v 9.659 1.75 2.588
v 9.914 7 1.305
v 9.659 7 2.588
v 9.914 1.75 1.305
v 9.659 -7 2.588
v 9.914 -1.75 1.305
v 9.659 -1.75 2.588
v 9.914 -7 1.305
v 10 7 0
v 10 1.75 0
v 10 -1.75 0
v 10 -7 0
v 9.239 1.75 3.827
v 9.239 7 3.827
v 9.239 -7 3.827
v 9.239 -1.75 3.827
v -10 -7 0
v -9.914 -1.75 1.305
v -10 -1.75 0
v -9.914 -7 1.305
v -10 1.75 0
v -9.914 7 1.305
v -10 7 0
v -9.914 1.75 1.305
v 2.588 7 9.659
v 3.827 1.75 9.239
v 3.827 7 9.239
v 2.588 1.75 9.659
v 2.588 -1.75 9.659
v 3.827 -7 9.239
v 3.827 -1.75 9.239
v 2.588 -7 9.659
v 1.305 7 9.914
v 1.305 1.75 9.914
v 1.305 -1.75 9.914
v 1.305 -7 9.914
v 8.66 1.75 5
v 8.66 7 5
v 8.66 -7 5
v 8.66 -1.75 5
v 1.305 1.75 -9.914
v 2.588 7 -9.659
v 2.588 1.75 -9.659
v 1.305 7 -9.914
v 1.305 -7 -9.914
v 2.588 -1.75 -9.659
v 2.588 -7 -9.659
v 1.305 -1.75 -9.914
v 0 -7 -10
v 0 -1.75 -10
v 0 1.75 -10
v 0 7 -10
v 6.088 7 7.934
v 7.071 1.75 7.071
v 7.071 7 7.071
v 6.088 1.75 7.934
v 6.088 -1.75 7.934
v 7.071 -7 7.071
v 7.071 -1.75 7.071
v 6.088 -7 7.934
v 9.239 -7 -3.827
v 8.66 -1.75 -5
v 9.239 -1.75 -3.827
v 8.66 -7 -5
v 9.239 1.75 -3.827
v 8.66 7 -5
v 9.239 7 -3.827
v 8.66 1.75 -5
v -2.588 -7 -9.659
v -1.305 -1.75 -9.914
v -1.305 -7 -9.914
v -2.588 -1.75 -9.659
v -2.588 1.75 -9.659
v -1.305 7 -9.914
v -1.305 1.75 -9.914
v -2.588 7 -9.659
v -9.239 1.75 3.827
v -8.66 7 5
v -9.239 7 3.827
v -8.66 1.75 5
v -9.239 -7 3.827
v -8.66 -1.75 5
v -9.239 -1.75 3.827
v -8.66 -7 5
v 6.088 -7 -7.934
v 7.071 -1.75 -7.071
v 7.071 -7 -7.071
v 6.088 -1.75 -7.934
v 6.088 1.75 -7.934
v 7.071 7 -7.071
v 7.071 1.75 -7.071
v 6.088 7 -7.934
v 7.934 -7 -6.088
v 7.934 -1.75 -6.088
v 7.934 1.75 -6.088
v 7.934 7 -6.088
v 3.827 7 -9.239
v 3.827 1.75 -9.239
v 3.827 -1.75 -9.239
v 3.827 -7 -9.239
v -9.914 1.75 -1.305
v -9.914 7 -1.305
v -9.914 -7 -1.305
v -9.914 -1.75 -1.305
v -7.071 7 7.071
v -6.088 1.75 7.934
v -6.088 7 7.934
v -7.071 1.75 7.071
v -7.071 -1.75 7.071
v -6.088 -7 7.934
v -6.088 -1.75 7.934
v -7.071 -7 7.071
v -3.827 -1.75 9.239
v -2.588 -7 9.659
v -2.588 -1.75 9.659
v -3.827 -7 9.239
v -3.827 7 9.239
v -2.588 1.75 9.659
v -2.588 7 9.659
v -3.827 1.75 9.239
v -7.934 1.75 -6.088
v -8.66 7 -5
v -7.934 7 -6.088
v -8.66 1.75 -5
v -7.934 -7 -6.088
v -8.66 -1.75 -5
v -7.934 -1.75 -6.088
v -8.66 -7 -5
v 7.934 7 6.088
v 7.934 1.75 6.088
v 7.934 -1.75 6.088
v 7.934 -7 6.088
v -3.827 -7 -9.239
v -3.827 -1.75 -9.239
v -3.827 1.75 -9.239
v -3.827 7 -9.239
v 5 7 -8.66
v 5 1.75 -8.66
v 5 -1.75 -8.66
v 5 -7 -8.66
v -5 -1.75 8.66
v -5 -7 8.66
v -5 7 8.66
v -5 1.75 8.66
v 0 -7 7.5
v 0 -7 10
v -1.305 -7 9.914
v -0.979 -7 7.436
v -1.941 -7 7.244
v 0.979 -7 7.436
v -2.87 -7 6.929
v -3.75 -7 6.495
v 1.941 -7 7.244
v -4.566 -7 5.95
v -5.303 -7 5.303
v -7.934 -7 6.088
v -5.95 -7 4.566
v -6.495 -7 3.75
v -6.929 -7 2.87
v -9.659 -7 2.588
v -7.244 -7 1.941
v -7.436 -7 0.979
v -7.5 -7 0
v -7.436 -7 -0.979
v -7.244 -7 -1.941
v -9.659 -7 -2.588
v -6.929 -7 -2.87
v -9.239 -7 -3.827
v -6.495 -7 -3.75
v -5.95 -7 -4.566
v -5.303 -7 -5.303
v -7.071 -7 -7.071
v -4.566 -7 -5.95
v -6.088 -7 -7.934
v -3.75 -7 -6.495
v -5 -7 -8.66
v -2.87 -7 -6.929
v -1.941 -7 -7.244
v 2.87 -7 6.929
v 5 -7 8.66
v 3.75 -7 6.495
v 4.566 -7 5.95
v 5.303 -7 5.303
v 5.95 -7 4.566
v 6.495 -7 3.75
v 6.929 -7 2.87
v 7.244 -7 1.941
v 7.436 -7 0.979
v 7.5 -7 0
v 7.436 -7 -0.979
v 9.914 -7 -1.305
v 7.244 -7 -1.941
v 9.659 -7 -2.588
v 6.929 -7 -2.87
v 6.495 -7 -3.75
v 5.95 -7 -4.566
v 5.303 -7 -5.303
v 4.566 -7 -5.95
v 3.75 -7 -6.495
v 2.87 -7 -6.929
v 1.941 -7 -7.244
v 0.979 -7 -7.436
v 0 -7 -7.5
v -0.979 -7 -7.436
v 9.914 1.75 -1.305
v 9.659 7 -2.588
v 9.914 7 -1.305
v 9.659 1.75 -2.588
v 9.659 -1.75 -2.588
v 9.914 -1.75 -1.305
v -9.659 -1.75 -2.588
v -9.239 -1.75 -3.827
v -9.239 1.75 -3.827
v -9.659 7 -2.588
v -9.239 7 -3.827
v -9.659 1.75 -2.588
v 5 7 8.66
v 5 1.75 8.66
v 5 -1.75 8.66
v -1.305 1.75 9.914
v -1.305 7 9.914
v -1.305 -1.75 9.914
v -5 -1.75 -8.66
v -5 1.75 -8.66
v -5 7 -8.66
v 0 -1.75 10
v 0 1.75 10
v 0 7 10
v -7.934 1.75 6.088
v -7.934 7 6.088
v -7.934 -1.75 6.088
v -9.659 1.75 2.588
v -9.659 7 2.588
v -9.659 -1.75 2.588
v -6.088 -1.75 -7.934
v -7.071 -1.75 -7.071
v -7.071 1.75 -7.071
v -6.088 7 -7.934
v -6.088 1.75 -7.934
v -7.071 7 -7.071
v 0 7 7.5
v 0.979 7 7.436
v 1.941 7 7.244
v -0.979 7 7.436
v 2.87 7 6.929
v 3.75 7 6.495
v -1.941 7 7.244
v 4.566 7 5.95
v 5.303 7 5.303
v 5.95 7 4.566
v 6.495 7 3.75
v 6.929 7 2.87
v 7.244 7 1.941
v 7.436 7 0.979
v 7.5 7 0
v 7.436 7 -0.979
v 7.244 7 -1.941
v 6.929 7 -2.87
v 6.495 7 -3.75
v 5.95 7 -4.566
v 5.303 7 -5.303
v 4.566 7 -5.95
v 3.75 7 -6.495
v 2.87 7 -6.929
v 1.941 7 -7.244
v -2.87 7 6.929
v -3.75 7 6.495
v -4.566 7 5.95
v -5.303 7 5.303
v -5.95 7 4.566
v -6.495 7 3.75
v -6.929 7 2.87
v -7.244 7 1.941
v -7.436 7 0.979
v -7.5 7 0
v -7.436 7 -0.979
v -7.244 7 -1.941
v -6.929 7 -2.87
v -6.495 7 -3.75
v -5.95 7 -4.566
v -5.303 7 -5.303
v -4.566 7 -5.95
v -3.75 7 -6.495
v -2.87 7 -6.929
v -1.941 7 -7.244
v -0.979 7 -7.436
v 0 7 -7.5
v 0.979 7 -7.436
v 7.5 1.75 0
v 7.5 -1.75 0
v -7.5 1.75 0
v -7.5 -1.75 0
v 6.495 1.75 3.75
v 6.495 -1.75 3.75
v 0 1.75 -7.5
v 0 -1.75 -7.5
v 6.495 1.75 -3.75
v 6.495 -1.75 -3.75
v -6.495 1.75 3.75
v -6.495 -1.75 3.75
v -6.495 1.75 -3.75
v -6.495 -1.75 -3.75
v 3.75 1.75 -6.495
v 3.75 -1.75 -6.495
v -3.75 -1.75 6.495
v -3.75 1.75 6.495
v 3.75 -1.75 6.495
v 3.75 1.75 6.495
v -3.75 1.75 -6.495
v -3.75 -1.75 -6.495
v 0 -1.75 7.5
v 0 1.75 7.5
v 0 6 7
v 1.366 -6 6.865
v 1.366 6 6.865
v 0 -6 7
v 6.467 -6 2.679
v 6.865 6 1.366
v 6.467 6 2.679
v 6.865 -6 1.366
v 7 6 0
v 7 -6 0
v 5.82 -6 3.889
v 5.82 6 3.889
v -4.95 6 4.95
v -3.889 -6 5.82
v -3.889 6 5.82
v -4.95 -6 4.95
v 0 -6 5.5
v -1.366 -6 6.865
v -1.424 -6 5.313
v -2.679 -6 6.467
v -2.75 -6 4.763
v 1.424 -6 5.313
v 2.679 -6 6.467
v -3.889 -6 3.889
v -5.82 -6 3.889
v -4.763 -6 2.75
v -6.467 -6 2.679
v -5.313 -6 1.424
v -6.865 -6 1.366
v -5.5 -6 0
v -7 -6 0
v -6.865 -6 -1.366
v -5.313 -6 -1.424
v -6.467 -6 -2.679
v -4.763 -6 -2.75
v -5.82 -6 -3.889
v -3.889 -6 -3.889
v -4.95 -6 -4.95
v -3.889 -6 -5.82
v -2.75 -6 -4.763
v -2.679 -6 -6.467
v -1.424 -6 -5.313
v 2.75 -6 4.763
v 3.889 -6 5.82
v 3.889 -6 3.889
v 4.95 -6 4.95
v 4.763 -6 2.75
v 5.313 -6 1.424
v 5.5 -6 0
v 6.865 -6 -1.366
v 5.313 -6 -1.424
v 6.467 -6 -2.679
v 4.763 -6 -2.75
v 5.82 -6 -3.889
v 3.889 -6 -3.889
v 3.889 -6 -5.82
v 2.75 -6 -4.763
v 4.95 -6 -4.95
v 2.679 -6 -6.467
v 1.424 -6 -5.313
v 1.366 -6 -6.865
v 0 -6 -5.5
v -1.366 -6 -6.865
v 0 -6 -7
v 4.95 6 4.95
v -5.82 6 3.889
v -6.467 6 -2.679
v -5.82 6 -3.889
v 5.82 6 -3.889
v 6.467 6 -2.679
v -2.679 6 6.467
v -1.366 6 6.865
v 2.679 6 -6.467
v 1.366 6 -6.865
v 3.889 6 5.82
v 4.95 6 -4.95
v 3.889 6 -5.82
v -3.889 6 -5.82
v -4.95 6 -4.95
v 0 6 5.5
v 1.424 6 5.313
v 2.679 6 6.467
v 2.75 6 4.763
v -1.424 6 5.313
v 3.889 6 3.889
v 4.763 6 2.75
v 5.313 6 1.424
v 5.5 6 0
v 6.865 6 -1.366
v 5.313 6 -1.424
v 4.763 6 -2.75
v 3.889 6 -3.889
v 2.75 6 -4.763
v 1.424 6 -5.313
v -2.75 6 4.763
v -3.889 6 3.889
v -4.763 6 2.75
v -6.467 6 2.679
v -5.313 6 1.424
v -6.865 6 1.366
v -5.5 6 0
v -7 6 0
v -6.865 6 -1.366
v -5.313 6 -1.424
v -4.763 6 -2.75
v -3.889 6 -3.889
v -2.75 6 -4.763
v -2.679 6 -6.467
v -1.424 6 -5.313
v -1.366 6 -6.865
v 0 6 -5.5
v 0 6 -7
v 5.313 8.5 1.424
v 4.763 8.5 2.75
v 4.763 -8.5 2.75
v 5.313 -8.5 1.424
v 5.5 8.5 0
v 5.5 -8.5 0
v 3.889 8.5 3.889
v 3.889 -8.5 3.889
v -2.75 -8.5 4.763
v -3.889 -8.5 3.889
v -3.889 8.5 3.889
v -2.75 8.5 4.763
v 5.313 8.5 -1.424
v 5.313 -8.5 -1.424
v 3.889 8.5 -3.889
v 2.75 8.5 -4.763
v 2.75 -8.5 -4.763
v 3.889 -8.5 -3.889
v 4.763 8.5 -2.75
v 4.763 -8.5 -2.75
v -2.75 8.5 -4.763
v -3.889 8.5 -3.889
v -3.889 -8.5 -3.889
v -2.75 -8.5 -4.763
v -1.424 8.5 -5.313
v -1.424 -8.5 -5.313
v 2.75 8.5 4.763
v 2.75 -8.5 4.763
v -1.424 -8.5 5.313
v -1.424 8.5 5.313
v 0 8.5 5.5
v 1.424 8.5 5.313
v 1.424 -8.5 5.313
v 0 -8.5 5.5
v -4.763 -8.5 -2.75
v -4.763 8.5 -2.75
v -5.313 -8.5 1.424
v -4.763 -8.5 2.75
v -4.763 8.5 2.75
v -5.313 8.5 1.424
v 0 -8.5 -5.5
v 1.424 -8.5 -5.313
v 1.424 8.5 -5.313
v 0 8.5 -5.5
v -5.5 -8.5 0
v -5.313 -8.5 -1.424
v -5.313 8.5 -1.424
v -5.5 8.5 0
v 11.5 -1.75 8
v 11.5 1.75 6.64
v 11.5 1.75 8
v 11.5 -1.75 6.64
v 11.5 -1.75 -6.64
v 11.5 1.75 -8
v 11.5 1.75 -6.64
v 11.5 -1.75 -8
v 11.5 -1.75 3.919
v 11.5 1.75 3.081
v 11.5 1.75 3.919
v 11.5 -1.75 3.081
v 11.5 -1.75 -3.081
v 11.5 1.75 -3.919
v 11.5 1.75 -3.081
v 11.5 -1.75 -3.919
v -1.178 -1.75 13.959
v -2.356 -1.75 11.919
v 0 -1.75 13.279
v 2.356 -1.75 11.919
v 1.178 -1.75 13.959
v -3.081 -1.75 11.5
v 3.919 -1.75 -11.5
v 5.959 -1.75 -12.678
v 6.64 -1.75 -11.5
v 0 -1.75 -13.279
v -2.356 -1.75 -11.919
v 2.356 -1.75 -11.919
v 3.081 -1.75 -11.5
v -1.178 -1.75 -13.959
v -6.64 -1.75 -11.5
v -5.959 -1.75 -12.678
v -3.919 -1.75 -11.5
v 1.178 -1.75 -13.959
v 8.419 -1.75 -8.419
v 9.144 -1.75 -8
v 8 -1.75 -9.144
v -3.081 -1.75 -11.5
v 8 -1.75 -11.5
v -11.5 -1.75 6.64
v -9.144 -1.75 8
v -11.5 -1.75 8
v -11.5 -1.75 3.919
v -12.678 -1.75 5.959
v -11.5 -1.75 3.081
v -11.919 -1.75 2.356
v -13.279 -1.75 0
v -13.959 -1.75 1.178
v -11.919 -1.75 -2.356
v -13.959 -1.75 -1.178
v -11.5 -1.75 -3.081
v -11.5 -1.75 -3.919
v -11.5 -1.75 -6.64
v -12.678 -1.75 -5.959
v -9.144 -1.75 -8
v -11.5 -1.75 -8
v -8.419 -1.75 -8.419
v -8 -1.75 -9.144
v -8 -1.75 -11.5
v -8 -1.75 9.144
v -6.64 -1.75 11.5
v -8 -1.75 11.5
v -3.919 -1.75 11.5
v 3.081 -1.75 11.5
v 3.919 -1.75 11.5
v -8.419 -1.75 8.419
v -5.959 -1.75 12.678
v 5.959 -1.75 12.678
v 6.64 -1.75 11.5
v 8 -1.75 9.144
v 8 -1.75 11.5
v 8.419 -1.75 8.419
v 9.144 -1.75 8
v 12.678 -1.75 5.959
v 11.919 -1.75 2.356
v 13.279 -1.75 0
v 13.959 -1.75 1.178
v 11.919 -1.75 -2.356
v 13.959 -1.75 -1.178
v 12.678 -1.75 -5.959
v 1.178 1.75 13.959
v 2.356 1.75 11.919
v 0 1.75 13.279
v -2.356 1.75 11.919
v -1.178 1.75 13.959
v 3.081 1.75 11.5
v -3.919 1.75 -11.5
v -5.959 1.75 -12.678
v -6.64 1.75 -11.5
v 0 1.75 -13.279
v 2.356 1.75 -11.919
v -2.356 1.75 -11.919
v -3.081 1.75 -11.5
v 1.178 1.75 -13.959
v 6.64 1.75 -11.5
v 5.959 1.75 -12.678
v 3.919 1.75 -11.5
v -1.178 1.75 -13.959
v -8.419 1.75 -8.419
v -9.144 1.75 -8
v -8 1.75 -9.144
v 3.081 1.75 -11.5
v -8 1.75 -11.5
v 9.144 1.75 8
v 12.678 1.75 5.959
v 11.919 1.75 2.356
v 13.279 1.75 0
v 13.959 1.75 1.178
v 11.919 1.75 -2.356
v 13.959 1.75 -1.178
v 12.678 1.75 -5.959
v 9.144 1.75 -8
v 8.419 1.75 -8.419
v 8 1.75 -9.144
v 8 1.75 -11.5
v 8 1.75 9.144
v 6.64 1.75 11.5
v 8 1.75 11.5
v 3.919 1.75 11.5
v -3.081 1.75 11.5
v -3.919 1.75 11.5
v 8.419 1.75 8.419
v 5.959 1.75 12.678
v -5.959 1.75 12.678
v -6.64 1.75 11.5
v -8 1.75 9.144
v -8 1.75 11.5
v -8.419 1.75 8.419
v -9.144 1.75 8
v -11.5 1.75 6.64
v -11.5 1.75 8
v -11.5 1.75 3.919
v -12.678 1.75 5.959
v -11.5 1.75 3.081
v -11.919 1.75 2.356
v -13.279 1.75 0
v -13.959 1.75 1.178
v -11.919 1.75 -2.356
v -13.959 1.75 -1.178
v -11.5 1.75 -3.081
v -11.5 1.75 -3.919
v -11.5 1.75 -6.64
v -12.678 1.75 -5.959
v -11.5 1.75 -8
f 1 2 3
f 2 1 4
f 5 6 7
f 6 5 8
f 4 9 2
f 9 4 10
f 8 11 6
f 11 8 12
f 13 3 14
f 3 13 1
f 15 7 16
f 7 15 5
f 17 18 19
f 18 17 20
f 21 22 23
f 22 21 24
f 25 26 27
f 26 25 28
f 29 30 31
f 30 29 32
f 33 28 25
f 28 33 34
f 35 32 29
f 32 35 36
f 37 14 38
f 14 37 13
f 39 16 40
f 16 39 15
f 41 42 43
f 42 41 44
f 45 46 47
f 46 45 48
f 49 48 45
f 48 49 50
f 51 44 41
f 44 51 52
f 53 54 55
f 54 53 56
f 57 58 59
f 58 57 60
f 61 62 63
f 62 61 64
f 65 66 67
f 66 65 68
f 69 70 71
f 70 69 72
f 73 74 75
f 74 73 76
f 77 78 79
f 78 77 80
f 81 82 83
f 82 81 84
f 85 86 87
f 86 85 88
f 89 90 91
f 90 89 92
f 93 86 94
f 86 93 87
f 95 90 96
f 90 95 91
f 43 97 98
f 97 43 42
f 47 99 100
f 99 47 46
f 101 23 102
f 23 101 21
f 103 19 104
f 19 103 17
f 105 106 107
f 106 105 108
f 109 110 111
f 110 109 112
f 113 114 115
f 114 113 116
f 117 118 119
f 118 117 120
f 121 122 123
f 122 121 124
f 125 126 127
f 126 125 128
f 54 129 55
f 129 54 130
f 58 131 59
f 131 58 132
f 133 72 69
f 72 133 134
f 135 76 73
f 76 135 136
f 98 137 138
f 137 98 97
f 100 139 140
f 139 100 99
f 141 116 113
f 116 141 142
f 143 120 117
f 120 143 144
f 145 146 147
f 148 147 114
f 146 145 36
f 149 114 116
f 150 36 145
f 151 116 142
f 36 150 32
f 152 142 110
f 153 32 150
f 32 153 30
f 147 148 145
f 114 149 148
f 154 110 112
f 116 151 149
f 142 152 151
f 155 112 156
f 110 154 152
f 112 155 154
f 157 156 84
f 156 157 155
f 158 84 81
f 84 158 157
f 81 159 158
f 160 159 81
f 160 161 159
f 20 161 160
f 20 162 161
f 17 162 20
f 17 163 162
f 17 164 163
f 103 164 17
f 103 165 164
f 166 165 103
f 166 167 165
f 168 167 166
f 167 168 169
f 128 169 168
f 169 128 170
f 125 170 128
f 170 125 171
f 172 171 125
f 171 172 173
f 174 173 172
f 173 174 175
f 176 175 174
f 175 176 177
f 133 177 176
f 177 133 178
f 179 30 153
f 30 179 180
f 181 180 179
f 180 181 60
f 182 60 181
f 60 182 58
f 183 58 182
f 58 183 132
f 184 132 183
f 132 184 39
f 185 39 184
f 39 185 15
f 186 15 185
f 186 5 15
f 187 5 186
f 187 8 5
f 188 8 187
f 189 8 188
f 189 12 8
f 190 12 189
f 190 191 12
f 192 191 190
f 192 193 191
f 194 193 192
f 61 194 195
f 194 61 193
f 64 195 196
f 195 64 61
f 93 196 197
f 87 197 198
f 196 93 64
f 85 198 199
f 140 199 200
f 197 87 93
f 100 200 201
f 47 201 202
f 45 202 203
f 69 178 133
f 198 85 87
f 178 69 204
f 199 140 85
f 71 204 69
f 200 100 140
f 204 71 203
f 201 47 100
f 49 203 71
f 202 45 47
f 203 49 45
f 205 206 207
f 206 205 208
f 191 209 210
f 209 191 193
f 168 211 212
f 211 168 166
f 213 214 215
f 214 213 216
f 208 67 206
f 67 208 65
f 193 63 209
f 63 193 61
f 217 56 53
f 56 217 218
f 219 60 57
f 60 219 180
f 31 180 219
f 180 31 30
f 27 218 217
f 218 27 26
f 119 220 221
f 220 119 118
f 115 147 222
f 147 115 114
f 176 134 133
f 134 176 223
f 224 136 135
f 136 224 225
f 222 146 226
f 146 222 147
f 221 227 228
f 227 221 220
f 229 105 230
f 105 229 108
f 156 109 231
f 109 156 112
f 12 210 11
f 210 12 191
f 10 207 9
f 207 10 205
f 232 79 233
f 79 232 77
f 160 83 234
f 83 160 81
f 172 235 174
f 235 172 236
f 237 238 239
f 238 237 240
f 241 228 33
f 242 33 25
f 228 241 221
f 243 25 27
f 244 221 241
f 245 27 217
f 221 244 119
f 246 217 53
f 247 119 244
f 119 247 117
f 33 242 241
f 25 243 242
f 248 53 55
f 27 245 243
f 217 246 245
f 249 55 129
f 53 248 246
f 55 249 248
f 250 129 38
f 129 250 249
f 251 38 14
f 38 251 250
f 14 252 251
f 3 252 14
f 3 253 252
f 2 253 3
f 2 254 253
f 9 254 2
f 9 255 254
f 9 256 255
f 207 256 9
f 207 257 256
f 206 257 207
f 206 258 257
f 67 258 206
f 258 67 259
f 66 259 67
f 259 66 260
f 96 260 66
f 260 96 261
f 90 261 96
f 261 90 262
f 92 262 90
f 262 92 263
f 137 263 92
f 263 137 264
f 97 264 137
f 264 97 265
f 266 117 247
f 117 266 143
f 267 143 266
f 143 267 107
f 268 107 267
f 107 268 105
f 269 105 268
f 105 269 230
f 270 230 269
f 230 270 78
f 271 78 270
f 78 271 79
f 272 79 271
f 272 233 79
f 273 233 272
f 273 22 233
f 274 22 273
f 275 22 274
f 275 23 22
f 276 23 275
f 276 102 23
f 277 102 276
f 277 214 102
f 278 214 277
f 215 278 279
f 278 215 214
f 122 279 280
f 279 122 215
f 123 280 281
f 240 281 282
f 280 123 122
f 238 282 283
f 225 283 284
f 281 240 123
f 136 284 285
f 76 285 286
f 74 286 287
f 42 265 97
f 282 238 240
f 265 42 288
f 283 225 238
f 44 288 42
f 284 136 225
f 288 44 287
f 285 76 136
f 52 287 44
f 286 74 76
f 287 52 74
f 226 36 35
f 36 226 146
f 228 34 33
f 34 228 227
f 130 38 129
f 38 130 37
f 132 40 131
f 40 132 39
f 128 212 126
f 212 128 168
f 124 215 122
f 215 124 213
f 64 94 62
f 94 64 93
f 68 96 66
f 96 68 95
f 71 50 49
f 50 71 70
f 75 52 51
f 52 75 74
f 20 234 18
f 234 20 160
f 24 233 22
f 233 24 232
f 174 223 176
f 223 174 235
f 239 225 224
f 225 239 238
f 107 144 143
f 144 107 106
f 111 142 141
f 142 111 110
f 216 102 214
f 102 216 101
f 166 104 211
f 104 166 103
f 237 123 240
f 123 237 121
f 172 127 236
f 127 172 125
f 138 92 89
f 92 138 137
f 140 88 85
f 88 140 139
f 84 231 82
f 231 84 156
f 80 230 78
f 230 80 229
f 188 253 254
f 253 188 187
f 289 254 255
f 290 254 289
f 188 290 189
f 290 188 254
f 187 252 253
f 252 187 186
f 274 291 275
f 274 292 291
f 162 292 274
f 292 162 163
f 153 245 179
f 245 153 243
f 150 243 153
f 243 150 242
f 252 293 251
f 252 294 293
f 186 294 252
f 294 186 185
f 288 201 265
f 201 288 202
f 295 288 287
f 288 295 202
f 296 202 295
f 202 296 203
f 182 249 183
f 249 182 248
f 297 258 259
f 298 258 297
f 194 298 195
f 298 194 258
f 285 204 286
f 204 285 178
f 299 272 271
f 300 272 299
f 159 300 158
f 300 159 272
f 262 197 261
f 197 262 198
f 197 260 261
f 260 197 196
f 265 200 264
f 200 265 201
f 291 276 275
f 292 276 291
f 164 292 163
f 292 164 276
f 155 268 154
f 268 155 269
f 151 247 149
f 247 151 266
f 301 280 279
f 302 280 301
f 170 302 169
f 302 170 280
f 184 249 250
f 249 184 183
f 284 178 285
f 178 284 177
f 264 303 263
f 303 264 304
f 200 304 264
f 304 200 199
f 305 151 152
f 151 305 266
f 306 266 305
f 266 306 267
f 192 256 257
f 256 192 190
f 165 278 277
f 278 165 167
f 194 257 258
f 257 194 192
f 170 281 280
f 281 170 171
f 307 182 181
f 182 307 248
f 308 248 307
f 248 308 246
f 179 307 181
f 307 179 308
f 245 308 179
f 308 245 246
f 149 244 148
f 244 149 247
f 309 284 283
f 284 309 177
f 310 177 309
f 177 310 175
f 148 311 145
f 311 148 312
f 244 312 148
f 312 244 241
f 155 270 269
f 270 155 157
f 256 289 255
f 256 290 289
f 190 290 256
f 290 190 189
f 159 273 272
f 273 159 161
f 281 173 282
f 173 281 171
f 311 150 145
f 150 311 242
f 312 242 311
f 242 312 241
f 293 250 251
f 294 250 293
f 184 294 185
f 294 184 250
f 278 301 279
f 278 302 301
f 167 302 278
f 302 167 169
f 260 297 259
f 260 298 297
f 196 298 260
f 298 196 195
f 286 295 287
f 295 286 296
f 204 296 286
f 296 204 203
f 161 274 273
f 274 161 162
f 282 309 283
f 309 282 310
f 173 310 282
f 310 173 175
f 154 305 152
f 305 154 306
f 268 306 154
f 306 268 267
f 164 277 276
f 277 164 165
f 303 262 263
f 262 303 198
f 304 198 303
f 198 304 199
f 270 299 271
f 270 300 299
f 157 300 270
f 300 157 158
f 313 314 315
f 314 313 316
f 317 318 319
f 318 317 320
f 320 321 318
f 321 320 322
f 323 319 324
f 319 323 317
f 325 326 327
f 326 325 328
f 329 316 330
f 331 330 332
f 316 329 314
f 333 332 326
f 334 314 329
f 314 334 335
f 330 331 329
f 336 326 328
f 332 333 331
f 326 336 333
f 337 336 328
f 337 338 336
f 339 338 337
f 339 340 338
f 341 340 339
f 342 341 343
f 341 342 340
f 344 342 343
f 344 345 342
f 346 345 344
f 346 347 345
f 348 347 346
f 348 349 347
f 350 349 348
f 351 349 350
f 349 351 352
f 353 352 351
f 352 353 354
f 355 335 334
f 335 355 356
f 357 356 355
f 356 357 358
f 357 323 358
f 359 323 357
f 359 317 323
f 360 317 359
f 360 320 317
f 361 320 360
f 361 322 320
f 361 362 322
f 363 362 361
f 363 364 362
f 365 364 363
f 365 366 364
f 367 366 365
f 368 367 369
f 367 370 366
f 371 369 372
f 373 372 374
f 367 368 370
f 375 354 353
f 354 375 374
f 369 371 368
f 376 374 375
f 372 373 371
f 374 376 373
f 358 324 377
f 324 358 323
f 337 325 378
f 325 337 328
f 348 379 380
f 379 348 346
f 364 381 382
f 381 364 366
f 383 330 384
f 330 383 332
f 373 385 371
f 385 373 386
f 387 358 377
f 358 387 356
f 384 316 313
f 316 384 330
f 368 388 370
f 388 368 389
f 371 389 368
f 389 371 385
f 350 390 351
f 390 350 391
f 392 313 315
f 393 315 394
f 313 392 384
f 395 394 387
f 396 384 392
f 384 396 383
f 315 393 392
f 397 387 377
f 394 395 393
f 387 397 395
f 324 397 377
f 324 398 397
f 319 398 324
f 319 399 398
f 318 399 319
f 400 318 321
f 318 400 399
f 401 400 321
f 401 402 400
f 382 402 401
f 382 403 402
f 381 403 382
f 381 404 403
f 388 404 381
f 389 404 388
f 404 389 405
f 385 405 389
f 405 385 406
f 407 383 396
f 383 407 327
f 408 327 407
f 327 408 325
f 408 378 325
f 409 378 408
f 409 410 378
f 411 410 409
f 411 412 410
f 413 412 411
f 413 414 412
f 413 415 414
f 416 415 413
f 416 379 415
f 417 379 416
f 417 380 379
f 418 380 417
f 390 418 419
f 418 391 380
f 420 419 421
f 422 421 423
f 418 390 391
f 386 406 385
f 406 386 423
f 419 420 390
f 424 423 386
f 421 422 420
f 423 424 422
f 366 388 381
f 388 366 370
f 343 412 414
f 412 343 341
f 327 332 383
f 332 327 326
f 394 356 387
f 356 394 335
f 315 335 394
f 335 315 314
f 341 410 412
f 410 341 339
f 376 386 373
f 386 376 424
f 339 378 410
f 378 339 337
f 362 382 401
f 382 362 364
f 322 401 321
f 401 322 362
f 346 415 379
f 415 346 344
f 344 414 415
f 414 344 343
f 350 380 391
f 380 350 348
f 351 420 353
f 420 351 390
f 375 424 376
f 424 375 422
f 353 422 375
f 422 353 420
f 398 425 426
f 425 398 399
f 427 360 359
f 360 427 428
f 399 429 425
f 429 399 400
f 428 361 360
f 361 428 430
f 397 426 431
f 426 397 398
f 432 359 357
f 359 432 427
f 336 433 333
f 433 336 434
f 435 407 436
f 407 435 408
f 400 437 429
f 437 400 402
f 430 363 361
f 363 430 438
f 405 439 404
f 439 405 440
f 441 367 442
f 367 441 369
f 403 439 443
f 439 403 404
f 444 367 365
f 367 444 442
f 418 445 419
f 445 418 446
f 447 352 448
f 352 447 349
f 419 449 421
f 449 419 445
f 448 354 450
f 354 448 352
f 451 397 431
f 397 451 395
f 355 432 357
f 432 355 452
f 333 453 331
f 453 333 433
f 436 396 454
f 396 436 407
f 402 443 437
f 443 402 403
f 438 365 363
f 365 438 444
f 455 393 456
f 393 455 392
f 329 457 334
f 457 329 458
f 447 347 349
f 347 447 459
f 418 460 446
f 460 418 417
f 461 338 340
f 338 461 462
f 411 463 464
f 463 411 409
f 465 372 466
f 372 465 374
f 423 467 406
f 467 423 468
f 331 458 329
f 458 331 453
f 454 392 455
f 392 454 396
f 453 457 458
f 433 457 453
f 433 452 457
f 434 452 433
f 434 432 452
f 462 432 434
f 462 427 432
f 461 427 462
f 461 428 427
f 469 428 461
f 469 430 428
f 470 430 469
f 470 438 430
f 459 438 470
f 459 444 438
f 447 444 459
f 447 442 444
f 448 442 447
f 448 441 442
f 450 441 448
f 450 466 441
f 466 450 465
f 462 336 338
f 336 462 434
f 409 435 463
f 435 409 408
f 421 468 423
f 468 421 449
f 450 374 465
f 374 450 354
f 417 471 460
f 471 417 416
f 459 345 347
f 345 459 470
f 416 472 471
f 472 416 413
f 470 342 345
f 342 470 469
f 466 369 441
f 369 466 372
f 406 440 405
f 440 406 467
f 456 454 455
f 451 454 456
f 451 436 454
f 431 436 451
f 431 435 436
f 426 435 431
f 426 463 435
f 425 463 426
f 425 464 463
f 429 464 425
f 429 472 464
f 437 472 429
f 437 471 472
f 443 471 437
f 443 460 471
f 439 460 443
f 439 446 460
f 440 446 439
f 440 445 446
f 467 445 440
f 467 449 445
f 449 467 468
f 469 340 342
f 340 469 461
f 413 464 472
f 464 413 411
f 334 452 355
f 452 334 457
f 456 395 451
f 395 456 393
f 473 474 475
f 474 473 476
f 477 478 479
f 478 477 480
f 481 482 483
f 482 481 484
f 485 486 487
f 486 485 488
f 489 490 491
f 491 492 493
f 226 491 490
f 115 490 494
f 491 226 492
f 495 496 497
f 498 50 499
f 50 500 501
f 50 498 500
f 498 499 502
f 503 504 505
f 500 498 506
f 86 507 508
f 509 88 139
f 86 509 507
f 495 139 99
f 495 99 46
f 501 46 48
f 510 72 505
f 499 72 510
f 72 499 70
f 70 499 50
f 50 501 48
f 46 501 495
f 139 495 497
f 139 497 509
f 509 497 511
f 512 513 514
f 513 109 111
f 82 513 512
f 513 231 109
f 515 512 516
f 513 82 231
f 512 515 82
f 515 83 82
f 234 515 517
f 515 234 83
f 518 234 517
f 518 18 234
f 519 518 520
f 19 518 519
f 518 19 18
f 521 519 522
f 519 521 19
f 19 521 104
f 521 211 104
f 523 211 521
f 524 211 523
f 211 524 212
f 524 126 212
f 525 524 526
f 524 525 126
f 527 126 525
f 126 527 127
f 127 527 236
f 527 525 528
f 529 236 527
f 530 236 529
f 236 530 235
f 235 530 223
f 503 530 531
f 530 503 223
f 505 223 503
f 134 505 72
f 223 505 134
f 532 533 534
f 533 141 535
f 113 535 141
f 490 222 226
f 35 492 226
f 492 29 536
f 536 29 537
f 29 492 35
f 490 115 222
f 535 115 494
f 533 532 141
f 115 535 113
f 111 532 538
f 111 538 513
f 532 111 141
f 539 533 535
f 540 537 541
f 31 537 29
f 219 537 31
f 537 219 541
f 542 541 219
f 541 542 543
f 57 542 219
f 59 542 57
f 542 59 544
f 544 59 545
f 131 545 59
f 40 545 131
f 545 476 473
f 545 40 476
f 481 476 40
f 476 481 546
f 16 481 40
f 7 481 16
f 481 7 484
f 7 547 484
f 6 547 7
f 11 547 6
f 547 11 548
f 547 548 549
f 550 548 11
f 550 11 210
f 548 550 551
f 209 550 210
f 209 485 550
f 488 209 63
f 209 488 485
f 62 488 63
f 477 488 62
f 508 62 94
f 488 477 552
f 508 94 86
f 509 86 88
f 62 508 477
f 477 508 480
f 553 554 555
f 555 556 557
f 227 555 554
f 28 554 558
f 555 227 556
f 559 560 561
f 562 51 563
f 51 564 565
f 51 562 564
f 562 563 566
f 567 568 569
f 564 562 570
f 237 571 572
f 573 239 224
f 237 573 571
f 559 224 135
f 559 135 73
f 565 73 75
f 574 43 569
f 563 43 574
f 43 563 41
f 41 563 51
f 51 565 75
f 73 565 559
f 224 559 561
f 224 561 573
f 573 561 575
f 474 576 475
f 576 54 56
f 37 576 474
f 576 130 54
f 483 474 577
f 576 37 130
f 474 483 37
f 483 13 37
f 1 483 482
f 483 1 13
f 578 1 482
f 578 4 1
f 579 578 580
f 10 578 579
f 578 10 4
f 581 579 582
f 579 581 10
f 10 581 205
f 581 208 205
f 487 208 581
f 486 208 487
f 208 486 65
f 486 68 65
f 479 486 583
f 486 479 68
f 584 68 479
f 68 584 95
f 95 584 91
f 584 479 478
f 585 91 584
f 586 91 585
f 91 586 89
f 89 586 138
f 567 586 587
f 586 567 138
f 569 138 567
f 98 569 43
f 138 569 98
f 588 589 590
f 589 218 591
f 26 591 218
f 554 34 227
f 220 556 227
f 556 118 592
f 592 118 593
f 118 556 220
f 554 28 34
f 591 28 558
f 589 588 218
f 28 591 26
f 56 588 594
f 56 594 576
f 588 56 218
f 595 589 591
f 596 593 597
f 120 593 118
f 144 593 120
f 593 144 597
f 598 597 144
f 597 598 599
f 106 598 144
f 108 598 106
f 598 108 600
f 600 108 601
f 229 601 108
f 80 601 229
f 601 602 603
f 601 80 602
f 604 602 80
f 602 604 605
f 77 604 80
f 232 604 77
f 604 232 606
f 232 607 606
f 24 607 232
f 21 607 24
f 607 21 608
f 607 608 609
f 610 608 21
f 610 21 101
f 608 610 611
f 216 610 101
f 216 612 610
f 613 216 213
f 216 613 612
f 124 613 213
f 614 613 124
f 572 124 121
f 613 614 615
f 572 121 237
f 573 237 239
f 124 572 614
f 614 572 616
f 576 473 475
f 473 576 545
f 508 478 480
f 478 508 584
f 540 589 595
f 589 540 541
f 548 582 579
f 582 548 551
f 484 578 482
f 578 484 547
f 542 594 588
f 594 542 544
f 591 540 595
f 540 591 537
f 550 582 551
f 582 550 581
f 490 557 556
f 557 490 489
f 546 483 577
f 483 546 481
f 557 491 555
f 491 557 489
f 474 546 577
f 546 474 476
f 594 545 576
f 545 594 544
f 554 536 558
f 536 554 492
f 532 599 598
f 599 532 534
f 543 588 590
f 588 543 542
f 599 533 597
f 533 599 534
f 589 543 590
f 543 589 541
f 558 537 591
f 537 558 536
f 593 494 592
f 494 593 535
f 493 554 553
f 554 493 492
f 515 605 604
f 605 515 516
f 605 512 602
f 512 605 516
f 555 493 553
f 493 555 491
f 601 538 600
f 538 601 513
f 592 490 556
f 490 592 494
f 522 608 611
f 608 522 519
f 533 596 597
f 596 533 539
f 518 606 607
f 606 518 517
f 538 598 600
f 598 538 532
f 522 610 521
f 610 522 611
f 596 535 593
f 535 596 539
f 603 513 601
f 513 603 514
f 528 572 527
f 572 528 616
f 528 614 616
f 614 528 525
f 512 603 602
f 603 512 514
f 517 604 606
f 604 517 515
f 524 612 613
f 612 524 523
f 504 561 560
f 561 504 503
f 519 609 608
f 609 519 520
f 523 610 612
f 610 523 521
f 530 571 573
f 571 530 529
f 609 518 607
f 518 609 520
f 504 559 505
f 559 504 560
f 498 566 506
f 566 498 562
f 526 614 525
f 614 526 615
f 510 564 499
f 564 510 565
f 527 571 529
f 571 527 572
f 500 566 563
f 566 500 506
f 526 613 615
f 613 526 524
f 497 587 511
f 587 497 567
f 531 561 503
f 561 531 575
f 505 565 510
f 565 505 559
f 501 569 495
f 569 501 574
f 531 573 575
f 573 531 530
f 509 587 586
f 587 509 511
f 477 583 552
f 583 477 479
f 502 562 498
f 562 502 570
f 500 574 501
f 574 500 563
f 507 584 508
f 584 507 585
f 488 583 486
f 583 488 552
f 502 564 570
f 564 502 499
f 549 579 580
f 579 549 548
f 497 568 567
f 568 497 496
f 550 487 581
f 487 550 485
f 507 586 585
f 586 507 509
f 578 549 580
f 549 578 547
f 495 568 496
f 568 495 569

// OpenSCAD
// file: wheel.scad
include <parameters.scad>

module wheel(r, width, idler = false) {
    rotate([90, 0, 0]) {
        color(matRubber)
            difference() {
                cylinder(r = r, h = width, center = true, $fn = 48);
                cylinder(r = r - 2.5, h = width + 1, center = true, $fn = 48);
            }

        color(matAluminum)
            cylinder(r = r - 3, h = width - 2, center = true, $fn = 32);

        color(matAluminum)
            cylinder(r = idler ? 5.5 : 4.5, h = width + 3, center = true, $fn = 24);

        for (i = [0 : 5])
            rotate([0, 0, i * 60])
                color(matAluminum)
                    cube([2.5, 3, width - 1], center = true);
    }
}

module driveWheel(r, width) {
    wheel(r, width, true);

    rotate([90, 0, 0])
        for (i = [0 : 11])
            rotate([0, 0, i * 30])
                color(matDarkSteel)
                    translate([r - 0.5, 0, 0])
                        cube([4, width + 2, 3.5], center = true);
}
// file: parameters.scad
// Shared parameters for tracked wheelchair prototype
// NOTE: 1 unit = 1 cm (seat target 450 mm = 45 units above ground).
$fn = 48;

//================ MATERIALS =================//
// Frame: aluminum 6061-T6 (lightweight)
// Seat: carbon fiber T700 + honeycomb (ultralight)
// Suspension: rubber bushings (lightweight)
// Axles: aluminum 7075-T6 (1/3 weight of steel)
matSteel      = [0.35, 0.36, 0.38];   // hardware / fasteners only
matDarkSteel  = [0.25, 0.26, 0.28];
matRubber     = [0.12, 0.12, 0.14];   // track belt + bushings
matAluminum   = [0.55, 0.57, 0.60];   // primary frame material
matChrome     = [0.70, 0.72, 0.75];
matCarbon     = [0.15, 0.15, 0.18];   // (unused — seat now aluminum)
matLeather    = [0.45, 0.25, 0.12];   // leather cushion color

//================ TRACKS =================//
trackLength = 82;
trackWidth = 14;
trackCenterY = 28;

idlerRadius = 10;
idlerX = trackLength / 2;
idlerZ = 16;
roadRadius = 7;
roadZ = 13;  // road wheels roll on the belt's inner surface (belt upper edge at this height)
roadPositions = [-22, -6, 10, 24];

linkLength = 10;
linkWidth = trackWidth + 2;
linkThickness = 3;
linkGap = 1;
// Belt centerline clears the idler wheels plus link half-thickness,
// so the links ride on the wheels instead of clipping through them.
trackRadius = idlerRadius + linkThickness / 2;  // = 11.5
beltThickness = 3;
groundZ = idlerZ - trackRadius;  // bottom of track = ground level (4.5)

//================ HYDRAULIC JACK WHEEL =================//
trackTilt = 0;
liftPivotX = idlerX;
liftPivotZ = idlerZ;
// Electric linear actuator (24V DC, 500kg, 300mm stroke).
// 1/3 weight of hydraulic system.
hydrWheelRadius = 4;
hydrWheelWidth = 10;
hydrBarrelRadius = 4;        // smaller barrel (mini actuator)
hydrBarrelHeight = 12;       // shorter barrel
hydrRodRadius = 2;
// At full extension the jack wheel rests on the ground:
// mountZ 35 - groundZ 4.5 - wheelR 4 = 26.5
hydrExtend = 26.5;
hydrRetracted = 0;
hydrExtendAmount = hydrExtend;
hydrMountX = 10;   // jack mount x; moved forward (from 24) for first-stair clearance
hydrMountY = 0;

//================ CHASSIS =================//
chassisLength = 82;
chassisBottom = 35;
chassisHeight = 12;

//================ SEAT =================//
// Seat geometry: flat aluminium pan + leather cushion + slim backrest.
// Seat surface rides at 450 mm (45 units) above the ground.
// topZ = idlerZ + seatTopOffset = 49.5, ground at 4.5 -> seat 45 above ground.
seatPanLength = 66;
seatPanWidth = 66;
backShellHeight = 72;
headrestHeight = 16;
seatTopOffset = 45 - trackRadius;  // = 33.5
// Backrest recline (deg from vertical).
seatBackRecline = 8;

//================ FOOTREST =================//
footrestWidth = 34;
footrestLength = 28;
footrestThickness = 3;       // 3mm aluminum plate
footrestHeight = idlerZ + 12;
footrestFrontX = -30 - footrestLength / 2;  // plate center, extends forward from arm end

// Folding footplate pivots at the end of the L-bracket arm.
footPivotX = -30;                           // end of L-bracket horizontal arm
footPivotZ = idlerZ + seatTopOffset - 7;    // arm height (panB - 2)
footHeelGuard = true;                       // optional heel guard
footToeGuard = false;                       // optional toe guard (off by default)

//================ ARMRESTS =================//
armPivotX = idlerX - 14;                     // rear post at the seat back
armLength = 68;                              // full-length pad (covers seat depth)
armPadHeight = idlerZ + seatTopOffset + 19;  // pad top = elbow height (~19 above seat top)
armPadWidth = 8;
armPadThick = 4;
// main file
// STL EXPORT: Drive sprocket (single)
include <parameters.scad>
use <wheel.scad>
driveWheel(idlerRadius, trackWidth);
